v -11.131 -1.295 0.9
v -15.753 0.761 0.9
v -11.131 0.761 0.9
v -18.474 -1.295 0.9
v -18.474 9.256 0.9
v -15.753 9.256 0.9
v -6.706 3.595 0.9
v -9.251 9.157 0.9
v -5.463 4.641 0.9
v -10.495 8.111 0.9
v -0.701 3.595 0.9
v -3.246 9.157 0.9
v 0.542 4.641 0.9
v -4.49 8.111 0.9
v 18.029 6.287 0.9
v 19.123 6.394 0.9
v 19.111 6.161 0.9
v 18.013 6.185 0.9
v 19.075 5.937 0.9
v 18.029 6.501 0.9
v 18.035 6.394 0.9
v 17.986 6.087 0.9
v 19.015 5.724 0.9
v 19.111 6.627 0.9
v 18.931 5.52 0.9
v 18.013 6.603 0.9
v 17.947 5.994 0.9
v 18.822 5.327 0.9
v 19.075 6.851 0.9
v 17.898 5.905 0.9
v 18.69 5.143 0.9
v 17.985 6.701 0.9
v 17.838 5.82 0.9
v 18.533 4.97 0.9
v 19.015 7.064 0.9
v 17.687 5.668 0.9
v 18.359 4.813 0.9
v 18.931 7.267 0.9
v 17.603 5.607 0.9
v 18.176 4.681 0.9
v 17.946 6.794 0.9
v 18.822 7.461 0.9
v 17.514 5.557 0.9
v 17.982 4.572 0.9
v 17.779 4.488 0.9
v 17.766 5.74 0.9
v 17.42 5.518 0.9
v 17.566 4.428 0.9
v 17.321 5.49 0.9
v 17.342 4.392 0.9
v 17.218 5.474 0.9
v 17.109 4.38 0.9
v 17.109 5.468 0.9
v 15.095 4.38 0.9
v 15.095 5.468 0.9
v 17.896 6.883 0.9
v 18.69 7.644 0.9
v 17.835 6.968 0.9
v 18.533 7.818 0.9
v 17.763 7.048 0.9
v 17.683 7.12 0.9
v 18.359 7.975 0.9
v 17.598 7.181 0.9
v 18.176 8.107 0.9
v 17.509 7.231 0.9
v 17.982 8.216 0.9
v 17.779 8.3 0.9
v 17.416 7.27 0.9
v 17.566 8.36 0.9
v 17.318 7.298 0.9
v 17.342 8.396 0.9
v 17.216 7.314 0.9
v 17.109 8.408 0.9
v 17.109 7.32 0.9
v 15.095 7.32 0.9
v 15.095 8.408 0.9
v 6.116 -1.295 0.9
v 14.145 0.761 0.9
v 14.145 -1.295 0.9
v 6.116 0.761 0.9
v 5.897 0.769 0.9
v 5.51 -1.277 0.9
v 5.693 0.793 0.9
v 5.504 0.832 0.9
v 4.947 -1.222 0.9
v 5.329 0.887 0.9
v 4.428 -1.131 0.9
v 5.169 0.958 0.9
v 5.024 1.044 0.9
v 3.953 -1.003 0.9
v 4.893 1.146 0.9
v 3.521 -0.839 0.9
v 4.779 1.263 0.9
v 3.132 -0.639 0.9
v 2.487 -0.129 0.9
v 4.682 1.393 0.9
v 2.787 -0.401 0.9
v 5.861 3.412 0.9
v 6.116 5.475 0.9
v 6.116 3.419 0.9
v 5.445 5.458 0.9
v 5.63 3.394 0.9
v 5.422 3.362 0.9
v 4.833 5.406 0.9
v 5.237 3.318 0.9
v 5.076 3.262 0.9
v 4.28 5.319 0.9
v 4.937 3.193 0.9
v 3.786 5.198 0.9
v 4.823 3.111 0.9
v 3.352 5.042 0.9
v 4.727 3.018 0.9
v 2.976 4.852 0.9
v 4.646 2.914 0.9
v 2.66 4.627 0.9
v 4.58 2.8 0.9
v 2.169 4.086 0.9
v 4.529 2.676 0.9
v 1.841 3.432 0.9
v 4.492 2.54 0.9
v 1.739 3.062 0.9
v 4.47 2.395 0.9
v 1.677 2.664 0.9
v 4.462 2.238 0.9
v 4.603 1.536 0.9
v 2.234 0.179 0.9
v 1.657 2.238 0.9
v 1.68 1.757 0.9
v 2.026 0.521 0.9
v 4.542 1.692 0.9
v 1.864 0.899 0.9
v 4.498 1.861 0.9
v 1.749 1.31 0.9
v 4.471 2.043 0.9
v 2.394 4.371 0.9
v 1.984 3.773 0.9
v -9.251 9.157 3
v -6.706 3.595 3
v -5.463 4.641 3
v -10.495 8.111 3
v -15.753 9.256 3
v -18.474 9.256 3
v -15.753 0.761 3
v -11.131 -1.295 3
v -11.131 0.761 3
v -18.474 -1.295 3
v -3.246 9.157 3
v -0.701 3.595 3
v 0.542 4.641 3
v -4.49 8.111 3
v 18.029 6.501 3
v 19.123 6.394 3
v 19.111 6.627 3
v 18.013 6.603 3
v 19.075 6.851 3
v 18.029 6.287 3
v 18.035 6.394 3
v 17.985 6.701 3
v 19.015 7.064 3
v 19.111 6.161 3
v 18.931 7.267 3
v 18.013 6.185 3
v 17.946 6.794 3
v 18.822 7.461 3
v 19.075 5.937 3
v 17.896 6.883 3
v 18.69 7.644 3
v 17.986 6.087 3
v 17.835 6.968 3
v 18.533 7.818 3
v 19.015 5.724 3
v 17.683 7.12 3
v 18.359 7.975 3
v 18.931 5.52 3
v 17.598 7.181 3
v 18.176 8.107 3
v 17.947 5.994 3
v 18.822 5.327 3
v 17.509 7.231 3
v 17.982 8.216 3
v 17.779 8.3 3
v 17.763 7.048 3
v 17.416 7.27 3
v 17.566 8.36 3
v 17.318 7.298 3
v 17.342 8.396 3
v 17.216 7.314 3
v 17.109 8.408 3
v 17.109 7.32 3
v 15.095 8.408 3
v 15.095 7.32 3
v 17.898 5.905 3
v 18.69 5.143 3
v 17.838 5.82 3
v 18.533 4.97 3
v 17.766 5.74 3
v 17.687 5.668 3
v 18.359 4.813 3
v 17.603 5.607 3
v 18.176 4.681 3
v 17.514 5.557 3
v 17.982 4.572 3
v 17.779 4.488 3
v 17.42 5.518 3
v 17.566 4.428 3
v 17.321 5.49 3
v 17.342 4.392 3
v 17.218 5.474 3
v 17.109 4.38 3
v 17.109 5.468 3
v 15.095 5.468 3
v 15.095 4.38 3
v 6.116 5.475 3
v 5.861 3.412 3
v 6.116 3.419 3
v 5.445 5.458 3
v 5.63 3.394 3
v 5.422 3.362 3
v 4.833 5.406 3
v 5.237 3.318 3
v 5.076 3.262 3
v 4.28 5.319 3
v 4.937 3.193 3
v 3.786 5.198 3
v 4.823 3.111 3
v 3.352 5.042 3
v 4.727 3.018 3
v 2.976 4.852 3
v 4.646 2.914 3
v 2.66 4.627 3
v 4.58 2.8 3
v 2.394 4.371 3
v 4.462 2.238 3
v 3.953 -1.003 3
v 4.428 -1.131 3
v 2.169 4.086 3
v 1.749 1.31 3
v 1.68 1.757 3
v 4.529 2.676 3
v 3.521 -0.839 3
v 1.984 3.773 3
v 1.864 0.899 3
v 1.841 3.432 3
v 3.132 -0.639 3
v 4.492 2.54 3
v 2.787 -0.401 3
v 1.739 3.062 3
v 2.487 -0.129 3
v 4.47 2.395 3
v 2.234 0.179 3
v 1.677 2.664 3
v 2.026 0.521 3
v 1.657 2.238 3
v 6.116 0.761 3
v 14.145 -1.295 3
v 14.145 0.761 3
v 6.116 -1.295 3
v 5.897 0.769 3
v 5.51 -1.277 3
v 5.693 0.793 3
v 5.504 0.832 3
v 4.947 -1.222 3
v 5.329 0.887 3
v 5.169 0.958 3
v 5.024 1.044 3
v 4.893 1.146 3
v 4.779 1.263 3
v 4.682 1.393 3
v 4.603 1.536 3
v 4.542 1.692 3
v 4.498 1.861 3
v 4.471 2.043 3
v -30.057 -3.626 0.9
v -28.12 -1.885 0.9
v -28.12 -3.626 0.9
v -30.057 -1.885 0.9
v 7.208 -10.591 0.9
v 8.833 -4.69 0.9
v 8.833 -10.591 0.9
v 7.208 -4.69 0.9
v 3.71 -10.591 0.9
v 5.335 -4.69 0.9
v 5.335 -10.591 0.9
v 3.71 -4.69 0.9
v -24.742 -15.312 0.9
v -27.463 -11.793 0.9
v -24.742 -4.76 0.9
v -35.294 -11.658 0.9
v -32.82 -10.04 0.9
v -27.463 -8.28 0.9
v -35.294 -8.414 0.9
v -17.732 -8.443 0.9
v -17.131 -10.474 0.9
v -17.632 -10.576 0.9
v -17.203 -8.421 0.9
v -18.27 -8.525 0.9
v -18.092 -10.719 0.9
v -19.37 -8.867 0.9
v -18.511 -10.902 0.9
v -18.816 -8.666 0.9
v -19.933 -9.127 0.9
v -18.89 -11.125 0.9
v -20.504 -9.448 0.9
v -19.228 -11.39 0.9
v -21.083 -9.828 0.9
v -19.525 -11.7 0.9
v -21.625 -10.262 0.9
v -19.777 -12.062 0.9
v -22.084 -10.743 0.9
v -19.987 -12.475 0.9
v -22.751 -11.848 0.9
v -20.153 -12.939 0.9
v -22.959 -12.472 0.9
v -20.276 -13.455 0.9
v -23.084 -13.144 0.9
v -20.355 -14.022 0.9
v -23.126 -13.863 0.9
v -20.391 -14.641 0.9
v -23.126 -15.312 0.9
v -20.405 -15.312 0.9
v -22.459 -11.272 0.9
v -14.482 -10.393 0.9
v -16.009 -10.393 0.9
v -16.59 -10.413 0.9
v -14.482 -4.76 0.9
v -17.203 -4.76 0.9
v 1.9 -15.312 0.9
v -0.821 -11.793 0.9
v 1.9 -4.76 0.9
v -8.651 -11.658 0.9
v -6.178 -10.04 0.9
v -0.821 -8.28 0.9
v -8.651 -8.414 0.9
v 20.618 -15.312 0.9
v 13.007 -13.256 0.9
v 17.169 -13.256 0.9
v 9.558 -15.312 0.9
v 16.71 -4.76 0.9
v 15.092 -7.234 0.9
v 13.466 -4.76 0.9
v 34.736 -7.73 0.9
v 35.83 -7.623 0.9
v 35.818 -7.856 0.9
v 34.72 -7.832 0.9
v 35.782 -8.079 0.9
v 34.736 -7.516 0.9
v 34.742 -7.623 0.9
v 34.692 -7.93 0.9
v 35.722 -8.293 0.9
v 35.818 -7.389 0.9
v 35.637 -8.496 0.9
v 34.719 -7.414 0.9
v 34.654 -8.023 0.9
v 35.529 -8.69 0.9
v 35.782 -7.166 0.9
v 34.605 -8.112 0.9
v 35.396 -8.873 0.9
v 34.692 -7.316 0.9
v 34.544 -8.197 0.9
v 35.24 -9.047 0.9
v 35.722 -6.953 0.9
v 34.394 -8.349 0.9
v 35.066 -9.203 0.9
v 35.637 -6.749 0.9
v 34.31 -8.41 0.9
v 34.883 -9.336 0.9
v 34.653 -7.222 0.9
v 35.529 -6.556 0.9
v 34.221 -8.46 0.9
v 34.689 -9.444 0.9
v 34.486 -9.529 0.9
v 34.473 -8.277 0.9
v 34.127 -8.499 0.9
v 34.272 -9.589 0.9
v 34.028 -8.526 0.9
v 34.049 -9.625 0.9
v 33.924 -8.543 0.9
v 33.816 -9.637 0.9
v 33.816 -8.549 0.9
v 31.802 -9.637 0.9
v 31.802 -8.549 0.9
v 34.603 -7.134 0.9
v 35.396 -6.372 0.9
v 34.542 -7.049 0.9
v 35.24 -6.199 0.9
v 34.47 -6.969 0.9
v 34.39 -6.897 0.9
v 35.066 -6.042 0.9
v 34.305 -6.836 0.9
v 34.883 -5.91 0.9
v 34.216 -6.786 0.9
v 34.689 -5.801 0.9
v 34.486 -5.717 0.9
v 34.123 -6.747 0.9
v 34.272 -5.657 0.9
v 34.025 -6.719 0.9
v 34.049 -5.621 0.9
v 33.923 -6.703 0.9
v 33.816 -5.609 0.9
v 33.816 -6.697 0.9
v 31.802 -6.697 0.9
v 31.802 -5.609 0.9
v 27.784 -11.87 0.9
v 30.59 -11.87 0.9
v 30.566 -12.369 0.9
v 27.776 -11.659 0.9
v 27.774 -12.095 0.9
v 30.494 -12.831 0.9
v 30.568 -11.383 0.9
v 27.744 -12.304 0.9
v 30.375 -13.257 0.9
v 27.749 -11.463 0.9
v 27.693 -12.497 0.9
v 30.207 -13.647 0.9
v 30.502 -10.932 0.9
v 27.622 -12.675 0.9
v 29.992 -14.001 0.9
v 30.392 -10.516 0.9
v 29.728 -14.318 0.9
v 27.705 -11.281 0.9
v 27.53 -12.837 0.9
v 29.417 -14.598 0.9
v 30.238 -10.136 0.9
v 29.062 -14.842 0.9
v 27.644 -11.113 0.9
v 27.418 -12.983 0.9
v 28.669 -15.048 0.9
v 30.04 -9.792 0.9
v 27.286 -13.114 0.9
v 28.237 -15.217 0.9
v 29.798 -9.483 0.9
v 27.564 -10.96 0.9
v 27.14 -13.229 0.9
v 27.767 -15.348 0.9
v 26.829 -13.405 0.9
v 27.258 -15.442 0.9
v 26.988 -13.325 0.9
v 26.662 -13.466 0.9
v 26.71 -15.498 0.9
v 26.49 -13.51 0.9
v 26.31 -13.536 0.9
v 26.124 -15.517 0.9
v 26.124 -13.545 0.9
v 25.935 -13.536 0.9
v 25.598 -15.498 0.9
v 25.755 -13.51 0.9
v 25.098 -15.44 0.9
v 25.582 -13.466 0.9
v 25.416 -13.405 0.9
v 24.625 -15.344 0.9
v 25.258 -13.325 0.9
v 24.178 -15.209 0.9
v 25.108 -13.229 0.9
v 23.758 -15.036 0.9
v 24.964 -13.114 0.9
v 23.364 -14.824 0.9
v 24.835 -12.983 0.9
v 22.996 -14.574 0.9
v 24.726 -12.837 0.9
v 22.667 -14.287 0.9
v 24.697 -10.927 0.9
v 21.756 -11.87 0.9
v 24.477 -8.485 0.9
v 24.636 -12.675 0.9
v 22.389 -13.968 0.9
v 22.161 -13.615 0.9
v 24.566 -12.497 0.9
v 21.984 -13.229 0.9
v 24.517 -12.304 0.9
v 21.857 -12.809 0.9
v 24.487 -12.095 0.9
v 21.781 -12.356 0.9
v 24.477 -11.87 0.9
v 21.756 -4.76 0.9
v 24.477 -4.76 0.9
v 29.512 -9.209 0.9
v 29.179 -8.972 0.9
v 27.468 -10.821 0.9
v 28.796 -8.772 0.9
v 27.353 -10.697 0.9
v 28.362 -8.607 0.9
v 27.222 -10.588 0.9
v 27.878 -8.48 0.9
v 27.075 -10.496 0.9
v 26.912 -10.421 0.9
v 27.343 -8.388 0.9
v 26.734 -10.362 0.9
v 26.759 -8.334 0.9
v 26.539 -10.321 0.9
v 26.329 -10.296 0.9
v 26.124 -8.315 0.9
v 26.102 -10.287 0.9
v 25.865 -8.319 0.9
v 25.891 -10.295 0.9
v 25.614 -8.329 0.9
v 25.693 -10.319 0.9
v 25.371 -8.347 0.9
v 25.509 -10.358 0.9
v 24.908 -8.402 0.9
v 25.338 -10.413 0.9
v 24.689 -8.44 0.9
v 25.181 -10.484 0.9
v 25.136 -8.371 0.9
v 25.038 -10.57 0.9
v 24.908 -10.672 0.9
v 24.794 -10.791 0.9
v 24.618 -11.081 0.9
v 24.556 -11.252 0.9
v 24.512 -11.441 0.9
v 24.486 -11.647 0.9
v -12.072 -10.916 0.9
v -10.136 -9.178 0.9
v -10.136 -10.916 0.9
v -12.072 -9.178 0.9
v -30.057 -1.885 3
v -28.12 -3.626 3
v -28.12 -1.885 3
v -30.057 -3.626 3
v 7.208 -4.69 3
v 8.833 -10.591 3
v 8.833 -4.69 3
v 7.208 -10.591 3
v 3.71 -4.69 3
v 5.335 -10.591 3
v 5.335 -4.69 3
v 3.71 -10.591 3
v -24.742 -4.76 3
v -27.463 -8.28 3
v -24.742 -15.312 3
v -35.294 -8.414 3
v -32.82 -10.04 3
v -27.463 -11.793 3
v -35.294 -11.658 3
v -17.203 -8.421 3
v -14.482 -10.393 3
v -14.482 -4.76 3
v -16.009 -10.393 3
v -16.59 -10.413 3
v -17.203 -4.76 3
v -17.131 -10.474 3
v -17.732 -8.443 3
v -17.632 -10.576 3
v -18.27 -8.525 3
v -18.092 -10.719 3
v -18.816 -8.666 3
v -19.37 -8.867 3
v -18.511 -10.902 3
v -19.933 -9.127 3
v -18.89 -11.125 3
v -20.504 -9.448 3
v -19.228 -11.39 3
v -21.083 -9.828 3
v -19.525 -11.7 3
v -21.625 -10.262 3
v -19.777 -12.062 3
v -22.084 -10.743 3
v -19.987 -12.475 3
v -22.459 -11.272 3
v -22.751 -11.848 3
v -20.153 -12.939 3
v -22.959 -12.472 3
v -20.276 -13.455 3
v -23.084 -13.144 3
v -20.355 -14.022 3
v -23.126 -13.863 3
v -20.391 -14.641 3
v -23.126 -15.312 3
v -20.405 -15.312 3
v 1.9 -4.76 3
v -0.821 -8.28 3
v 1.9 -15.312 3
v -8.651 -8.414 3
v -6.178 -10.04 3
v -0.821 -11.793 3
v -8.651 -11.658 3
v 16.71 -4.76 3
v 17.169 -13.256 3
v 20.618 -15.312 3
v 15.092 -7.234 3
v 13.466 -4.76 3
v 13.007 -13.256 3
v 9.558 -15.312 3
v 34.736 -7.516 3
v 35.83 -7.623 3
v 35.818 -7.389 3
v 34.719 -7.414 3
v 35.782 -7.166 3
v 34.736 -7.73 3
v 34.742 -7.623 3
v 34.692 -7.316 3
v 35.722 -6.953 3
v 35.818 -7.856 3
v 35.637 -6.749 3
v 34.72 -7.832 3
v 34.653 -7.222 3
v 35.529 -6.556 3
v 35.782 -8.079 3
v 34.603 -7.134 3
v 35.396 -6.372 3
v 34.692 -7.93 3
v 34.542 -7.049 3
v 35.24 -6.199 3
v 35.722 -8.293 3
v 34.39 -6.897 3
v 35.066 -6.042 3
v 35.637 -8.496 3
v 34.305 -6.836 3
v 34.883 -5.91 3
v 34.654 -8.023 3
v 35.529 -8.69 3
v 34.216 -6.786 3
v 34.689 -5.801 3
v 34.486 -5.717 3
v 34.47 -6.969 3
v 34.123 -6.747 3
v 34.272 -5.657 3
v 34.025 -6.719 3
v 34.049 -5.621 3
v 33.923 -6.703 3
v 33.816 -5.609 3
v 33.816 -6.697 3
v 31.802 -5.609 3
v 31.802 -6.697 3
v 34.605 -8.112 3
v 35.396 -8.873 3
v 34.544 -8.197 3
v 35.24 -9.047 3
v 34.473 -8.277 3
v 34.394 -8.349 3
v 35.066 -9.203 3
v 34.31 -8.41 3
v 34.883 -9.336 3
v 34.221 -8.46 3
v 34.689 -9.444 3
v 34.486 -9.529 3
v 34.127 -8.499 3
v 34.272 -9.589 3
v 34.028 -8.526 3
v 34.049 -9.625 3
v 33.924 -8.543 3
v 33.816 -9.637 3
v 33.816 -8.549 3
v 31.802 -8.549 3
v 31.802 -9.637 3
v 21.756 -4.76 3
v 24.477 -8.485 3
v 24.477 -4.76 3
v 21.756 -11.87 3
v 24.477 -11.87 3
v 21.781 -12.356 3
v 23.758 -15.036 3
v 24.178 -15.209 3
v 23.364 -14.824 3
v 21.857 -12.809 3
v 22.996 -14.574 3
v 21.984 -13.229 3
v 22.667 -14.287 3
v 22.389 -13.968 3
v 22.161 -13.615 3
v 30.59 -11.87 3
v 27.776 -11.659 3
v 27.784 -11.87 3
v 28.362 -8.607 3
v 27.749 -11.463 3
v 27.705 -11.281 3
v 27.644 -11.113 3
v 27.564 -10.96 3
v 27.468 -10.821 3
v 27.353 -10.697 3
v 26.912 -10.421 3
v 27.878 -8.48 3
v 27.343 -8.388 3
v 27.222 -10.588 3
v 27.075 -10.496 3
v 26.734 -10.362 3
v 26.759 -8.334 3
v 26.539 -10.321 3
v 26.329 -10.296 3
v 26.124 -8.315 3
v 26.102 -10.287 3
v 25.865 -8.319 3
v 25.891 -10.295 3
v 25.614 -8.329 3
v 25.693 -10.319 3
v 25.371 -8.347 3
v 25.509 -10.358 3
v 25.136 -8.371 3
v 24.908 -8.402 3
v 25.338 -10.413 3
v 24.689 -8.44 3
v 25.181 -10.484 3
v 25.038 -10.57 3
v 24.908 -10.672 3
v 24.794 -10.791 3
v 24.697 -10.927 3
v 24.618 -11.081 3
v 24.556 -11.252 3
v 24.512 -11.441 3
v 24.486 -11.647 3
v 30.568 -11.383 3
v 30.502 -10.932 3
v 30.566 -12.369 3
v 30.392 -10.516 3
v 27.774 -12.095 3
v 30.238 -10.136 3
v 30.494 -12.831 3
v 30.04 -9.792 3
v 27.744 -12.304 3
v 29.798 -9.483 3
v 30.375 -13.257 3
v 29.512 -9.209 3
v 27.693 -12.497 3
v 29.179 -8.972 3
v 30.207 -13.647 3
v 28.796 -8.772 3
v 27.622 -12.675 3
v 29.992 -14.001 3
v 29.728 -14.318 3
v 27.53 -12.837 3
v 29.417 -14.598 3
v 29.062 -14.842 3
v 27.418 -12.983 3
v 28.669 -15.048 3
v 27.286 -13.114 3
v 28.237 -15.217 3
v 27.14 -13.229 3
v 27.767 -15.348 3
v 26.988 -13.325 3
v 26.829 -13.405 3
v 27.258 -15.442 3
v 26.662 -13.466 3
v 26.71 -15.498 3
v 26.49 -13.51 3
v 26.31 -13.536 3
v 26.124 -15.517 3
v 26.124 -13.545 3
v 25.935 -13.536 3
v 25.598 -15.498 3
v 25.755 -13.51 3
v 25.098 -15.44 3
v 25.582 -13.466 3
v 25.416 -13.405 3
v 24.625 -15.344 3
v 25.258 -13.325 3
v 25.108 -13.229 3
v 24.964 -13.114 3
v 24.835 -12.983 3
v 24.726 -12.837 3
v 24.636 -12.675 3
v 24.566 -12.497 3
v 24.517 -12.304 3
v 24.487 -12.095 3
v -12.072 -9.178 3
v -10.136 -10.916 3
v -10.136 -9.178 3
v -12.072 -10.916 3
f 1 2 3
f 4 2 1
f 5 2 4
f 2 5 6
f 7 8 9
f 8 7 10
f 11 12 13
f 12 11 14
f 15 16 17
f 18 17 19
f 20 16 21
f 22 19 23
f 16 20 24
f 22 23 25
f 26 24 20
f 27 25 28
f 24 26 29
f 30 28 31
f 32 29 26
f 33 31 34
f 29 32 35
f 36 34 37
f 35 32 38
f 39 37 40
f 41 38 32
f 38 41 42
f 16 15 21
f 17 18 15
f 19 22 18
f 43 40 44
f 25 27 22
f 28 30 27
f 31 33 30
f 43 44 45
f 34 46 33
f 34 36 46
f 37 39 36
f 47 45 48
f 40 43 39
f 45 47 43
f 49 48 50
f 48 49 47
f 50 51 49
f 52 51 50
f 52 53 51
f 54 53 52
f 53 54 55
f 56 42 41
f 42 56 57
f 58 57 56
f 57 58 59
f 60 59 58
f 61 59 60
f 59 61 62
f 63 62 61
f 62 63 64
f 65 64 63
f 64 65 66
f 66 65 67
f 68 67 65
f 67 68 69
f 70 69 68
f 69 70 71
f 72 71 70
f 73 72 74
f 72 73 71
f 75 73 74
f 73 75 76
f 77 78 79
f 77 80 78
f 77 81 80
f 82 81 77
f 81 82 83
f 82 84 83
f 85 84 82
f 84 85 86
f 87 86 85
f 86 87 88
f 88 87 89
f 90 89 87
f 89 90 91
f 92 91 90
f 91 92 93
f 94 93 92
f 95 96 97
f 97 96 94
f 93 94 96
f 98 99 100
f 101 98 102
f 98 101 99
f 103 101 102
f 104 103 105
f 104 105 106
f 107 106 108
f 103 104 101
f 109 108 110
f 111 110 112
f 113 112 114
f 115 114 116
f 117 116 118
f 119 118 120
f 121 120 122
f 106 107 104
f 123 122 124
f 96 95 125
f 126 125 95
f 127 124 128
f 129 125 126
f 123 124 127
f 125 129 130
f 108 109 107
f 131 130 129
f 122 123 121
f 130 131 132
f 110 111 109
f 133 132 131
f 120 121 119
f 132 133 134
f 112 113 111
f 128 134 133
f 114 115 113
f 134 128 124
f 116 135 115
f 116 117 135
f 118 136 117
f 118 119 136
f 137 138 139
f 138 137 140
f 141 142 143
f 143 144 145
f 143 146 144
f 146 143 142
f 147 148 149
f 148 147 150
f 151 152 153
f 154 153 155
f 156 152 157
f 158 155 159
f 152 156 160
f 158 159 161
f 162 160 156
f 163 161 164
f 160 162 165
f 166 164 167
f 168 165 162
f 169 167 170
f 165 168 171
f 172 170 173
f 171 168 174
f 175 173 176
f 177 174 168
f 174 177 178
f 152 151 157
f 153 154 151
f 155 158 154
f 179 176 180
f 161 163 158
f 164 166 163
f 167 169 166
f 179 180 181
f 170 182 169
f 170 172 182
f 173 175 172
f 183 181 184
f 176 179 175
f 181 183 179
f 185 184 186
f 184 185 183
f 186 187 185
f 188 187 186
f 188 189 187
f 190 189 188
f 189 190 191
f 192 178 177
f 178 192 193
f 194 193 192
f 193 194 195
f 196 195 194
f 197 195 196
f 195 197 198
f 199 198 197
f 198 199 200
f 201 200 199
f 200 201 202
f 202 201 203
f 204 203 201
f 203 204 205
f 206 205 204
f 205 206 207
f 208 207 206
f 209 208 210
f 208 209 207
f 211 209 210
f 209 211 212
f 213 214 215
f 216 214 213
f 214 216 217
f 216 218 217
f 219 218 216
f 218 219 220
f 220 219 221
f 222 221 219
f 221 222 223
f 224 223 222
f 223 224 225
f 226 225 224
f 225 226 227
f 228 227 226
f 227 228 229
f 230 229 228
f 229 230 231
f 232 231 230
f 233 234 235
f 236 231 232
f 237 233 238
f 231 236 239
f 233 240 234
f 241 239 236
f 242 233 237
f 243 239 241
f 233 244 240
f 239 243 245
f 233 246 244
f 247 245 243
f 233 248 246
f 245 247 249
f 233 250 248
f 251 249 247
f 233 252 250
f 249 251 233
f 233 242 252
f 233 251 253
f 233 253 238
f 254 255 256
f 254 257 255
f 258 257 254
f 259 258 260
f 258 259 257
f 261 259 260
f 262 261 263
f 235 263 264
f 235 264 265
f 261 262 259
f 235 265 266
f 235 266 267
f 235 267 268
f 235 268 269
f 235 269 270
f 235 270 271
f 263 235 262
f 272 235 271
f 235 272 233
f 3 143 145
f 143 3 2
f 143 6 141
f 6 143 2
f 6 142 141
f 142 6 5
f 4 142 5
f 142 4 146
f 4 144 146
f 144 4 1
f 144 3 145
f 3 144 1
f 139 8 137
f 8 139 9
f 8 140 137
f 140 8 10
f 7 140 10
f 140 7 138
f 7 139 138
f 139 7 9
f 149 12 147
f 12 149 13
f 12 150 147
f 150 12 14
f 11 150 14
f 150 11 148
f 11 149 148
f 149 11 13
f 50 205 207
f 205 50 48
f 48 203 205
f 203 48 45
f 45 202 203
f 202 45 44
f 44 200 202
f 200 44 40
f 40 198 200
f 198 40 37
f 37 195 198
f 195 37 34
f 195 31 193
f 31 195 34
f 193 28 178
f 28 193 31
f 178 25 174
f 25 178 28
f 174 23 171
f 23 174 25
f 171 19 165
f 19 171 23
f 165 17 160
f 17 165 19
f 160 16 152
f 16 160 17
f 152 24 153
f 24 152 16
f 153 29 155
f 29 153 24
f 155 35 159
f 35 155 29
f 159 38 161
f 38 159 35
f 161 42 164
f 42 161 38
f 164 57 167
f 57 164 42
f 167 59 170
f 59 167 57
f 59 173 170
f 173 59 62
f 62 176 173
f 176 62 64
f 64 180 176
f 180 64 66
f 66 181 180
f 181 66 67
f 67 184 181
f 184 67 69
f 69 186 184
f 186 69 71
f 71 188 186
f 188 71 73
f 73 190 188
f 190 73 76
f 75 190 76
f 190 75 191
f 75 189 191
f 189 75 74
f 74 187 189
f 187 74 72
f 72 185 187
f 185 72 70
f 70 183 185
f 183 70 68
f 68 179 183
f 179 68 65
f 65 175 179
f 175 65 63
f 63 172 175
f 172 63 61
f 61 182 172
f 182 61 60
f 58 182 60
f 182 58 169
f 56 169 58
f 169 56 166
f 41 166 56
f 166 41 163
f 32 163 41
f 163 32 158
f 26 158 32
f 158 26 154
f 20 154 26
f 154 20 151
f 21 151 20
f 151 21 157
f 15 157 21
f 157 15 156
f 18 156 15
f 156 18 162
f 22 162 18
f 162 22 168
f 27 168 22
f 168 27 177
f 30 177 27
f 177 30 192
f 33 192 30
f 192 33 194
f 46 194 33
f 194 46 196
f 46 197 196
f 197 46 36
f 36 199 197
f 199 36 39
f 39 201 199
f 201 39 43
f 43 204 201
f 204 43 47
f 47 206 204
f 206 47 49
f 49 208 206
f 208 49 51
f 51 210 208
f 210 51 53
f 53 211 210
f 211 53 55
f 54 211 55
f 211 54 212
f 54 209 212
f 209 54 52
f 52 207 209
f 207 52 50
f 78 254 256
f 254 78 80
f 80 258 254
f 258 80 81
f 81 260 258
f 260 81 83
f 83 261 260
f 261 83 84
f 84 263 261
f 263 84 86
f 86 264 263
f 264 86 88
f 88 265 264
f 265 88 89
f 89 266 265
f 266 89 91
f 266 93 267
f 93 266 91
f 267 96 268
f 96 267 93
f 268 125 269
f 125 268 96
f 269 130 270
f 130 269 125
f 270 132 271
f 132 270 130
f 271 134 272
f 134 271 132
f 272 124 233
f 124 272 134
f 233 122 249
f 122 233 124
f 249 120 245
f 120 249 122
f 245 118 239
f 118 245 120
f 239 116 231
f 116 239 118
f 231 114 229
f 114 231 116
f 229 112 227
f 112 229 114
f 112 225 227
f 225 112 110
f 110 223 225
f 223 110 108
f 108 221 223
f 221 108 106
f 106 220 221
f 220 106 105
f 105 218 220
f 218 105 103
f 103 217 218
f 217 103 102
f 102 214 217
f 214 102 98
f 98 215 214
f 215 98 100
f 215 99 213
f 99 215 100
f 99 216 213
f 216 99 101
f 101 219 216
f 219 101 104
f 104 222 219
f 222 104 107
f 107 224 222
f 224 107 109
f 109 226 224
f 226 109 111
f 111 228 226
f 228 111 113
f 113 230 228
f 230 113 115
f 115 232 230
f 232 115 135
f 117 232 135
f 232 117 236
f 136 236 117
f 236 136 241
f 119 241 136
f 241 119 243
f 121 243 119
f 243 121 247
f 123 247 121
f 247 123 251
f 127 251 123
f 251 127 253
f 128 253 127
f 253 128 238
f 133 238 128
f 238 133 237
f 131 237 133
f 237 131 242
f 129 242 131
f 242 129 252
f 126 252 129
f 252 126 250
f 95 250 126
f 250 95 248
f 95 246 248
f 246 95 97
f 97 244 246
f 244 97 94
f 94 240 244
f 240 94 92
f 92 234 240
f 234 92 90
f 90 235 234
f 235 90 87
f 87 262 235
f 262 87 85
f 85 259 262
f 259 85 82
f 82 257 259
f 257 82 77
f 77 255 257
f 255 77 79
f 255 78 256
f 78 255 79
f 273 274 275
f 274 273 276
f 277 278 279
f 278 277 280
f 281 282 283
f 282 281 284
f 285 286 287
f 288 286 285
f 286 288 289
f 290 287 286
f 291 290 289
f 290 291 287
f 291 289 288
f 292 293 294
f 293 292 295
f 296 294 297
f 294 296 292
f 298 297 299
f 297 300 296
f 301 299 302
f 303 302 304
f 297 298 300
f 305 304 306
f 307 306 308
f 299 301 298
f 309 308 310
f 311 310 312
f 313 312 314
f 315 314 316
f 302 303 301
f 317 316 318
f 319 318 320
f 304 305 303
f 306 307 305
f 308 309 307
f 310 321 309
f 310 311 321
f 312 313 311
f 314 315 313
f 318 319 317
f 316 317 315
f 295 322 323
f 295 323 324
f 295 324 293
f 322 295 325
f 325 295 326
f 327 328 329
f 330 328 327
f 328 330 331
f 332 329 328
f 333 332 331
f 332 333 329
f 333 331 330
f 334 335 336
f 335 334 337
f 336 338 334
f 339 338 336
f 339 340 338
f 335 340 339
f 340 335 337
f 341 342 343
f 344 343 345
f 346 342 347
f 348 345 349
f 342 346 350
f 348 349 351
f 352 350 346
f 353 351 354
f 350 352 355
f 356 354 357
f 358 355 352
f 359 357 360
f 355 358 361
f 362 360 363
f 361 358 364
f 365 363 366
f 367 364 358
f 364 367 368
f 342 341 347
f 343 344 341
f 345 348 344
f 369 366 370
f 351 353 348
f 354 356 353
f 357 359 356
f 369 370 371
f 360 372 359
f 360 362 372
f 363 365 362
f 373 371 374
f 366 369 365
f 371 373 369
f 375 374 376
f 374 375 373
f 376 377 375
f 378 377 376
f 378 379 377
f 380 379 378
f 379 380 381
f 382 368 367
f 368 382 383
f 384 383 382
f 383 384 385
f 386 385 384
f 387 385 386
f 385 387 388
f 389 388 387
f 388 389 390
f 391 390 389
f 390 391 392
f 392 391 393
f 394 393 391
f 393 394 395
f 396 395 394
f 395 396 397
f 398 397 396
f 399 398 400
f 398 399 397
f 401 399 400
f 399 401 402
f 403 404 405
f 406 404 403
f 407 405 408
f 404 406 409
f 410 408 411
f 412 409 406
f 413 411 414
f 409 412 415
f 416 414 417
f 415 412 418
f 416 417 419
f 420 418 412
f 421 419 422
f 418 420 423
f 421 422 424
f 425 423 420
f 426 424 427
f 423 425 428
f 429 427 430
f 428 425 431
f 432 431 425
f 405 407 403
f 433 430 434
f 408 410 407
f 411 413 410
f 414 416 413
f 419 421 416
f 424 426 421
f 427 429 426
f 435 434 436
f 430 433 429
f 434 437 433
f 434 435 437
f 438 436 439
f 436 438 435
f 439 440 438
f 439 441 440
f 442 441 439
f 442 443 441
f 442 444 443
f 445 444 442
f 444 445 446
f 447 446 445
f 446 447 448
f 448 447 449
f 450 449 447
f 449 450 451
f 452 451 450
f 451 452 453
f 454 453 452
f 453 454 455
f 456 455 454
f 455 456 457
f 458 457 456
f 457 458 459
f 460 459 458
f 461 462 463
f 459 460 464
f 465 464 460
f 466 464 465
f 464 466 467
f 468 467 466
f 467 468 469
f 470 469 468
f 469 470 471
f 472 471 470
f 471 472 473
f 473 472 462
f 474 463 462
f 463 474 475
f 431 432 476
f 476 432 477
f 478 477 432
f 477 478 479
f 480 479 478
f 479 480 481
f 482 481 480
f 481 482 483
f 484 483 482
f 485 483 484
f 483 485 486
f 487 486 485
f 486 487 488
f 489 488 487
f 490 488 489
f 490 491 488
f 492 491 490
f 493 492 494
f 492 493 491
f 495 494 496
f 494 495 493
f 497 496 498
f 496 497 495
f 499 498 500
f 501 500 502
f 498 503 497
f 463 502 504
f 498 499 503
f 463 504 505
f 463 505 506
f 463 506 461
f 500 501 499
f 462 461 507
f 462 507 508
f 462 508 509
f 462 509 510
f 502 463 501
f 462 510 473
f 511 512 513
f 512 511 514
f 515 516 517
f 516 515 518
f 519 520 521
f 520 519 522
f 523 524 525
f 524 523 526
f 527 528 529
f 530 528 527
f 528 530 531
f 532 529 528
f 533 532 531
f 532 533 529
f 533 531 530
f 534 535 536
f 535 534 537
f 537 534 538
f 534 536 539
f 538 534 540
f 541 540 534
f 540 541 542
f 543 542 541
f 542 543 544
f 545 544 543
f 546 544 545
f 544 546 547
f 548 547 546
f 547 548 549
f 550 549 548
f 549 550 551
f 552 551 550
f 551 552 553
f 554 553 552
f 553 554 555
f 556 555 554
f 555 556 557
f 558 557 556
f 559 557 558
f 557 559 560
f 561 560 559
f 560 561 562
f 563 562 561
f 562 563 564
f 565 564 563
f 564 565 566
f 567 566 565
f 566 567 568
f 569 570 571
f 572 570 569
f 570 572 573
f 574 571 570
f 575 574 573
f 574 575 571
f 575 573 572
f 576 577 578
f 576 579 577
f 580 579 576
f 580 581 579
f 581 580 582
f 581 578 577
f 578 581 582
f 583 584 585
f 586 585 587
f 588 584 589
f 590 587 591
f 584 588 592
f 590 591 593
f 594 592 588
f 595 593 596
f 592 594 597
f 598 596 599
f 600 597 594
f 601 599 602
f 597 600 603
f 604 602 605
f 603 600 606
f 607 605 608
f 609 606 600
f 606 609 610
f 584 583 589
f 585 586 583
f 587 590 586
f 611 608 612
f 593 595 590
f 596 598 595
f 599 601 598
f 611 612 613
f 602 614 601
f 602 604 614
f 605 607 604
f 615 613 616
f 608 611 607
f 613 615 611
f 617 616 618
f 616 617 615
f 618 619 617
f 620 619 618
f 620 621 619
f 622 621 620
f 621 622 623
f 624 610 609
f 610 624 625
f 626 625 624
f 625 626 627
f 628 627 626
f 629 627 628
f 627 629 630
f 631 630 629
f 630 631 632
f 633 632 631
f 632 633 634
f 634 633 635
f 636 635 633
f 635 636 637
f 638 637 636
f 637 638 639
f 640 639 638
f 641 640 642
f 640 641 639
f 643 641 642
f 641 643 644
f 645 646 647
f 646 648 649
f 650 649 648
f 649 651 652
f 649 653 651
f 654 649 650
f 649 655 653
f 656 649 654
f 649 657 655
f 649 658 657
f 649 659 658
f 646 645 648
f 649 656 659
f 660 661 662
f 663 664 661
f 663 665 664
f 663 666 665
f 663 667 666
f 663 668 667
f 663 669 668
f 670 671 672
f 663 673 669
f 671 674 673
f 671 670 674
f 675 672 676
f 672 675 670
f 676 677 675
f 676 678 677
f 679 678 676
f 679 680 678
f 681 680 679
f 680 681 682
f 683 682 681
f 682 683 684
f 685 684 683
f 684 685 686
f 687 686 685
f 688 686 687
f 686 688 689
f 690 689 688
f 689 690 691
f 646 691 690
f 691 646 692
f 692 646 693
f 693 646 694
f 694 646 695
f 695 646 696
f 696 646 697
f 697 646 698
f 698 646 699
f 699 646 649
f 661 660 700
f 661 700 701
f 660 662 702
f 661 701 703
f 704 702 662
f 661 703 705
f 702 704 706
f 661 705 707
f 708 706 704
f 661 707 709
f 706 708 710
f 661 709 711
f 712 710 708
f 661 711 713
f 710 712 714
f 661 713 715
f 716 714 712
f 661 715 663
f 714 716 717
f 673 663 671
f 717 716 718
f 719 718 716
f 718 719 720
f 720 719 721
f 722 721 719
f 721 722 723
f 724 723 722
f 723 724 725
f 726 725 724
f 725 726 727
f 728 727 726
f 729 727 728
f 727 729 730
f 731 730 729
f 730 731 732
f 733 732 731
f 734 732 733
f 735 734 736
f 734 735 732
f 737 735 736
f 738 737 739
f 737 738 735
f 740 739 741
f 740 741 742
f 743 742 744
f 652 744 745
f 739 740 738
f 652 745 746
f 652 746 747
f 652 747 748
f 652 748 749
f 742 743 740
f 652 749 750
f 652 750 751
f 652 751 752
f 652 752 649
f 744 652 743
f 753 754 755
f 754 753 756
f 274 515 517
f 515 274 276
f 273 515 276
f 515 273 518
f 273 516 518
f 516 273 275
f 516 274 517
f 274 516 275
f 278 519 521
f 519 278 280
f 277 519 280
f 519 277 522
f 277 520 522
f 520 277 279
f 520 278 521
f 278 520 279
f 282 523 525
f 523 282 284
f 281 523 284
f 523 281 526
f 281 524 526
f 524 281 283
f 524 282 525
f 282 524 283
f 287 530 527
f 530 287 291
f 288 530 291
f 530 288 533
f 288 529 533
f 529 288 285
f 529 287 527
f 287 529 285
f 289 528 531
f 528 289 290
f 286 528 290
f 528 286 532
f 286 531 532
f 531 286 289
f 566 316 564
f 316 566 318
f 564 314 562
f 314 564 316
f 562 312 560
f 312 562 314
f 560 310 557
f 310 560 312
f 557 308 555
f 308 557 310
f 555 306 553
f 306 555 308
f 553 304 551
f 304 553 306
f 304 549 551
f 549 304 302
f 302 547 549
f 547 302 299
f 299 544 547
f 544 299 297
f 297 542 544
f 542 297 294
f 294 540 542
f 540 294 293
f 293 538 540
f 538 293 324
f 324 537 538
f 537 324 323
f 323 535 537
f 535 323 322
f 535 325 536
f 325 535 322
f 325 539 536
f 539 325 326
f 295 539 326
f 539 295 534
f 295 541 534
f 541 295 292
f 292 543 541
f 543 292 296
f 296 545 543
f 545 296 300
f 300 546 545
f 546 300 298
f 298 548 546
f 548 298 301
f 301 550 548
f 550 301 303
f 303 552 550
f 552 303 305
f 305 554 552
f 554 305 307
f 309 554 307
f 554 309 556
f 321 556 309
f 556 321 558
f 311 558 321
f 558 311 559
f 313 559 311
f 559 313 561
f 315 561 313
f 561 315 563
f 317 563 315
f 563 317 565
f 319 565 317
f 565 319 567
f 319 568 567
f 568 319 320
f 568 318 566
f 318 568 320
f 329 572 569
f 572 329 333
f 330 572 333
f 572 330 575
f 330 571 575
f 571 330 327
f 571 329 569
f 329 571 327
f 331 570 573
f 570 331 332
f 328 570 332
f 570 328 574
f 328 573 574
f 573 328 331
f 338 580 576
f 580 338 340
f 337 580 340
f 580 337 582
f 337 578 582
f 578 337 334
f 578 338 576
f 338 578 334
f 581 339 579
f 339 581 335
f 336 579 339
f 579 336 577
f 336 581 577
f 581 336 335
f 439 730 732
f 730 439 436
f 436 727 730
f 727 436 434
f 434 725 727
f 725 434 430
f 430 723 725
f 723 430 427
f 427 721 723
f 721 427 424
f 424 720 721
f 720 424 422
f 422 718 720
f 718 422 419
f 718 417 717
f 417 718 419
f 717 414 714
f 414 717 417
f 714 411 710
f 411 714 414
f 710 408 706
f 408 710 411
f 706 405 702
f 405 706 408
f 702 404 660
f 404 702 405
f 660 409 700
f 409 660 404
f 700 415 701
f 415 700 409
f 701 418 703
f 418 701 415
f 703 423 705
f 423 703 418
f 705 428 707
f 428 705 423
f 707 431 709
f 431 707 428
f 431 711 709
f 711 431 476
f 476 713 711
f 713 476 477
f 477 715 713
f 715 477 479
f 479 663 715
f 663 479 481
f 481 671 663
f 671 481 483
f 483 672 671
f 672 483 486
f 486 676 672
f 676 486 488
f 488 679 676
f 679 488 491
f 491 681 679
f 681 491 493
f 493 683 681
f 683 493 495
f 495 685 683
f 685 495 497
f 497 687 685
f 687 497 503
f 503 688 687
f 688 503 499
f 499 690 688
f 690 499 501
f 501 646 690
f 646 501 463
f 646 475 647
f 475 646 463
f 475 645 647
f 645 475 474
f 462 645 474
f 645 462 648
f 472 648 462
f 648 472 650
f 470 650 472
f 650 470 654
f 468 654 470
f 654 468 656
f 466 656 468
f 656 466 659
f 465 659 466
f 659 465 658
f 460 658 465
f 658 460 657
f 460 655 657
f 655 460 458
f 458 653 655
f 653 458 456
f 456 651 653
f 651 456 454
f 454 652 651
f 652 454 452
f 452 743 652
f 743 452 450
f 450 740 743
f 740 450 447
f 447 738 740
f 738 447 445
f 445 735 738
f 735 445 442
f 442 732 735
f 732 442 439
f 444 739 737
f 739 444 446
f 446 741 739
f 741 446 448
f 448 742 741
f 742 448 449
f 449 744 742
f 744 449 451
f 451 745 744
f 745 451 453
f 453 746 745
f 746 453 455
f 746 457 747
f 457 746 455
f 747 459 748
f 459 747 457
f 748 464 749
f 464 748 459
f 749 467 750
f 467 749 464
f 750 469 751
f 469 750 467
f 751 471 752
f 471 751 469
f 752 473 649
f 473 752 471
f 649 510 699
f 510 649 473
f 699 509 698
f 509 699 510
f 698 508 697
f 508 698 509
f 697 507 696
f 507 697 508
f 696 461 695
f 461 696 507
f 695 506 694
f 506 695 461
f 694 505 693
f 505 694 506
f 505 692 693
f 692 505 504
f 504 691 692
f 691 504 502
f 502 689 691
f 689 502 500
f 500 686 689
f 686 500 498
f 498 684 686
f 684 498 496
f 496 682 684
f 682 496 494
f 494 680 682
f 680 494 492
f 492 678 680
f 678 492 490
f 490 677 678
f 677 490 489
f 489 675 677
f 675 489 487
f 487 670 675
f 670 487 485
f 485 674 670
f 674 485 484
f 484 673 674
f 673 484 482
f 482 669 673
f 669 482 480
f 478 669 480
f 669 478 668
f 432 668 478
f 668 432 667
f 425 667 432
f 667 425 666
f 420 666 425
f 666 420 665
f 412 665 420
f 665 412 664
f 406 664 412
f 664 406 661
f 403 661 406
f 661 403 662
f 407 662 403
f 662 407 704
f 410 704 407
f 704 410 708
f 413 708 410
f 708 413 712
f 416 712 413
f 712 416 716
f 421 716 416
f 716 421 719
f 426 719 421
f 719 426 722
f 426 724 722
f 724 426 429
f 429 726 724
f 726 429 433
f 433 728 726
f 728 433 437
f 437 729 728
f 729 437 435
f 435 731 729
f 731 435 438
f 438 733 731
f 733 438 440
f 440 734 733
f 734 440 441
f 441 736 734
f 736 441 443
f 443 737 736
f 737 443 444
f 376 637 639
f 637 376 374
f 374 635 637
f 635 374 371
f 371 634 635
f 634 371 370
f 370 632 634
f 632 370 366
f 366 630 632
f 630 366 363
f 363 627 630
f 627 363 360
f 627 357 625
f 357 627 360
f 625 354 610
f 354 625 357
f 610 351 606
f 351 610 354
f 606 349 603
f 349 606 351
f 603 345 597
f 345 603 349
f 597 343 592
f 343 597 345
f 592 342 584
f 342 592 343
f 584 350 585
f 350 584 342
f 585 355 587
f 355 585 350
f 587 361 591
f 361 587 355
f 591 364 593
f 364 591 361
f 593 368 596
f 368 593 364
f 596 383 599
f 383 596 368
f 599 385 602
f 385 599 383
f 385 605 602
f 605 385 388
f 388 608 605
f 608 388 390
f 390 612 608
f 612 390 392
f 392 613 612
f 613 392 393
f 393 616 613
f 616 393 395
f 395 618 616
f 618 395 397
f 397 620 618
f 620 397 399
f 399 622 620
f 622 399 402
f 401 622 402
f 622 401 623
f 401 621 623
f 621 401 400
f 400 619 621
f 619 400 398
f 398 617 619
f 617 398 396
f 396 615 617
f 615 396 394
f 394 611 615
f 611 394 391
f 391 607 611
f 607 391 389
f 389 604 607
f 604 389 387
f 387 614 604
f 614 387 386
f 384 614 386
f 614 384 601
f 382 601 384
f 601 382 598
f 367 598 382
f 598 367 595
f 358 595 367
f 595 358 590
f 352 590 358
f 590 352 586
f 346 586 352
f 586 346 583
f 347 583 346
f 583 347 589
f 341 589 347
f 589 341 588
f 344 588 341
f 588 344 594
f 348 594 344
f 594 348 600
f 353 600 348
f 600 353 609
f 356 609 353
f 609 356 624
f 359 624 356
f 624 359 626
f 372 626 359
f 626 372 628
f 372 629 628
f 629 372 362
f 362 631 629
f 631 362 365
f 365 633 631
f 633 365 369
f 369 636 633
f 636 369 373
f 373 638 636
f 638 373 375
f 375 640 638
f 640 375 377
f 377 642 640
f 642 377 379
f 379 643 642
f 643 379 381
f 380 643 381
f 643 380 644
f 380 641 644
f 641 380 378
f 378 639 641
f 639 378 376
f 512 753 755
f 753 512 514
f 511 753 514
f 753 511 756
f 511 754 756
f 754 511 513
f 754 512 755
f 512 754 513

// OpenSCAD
$fn = 48;
  // syllabics (overlaid on icon, tallest)
  translate([0, 3.857, 0.900]) linear_extrude(height=2.100) text("ᒪᐠᐠᓚᐣ", size=10.422, halign="center", valign="center", font="Euphemia UCAS:style=Bold");
  translate([0, -8.857, 0.900]) linear_extrude(height=2.100) text("ᐋᓱᐗᐦᐃᑲᐣ", size=10.422, halign="center", valign="center", font="Euphemia UCAS:style=Bold");
